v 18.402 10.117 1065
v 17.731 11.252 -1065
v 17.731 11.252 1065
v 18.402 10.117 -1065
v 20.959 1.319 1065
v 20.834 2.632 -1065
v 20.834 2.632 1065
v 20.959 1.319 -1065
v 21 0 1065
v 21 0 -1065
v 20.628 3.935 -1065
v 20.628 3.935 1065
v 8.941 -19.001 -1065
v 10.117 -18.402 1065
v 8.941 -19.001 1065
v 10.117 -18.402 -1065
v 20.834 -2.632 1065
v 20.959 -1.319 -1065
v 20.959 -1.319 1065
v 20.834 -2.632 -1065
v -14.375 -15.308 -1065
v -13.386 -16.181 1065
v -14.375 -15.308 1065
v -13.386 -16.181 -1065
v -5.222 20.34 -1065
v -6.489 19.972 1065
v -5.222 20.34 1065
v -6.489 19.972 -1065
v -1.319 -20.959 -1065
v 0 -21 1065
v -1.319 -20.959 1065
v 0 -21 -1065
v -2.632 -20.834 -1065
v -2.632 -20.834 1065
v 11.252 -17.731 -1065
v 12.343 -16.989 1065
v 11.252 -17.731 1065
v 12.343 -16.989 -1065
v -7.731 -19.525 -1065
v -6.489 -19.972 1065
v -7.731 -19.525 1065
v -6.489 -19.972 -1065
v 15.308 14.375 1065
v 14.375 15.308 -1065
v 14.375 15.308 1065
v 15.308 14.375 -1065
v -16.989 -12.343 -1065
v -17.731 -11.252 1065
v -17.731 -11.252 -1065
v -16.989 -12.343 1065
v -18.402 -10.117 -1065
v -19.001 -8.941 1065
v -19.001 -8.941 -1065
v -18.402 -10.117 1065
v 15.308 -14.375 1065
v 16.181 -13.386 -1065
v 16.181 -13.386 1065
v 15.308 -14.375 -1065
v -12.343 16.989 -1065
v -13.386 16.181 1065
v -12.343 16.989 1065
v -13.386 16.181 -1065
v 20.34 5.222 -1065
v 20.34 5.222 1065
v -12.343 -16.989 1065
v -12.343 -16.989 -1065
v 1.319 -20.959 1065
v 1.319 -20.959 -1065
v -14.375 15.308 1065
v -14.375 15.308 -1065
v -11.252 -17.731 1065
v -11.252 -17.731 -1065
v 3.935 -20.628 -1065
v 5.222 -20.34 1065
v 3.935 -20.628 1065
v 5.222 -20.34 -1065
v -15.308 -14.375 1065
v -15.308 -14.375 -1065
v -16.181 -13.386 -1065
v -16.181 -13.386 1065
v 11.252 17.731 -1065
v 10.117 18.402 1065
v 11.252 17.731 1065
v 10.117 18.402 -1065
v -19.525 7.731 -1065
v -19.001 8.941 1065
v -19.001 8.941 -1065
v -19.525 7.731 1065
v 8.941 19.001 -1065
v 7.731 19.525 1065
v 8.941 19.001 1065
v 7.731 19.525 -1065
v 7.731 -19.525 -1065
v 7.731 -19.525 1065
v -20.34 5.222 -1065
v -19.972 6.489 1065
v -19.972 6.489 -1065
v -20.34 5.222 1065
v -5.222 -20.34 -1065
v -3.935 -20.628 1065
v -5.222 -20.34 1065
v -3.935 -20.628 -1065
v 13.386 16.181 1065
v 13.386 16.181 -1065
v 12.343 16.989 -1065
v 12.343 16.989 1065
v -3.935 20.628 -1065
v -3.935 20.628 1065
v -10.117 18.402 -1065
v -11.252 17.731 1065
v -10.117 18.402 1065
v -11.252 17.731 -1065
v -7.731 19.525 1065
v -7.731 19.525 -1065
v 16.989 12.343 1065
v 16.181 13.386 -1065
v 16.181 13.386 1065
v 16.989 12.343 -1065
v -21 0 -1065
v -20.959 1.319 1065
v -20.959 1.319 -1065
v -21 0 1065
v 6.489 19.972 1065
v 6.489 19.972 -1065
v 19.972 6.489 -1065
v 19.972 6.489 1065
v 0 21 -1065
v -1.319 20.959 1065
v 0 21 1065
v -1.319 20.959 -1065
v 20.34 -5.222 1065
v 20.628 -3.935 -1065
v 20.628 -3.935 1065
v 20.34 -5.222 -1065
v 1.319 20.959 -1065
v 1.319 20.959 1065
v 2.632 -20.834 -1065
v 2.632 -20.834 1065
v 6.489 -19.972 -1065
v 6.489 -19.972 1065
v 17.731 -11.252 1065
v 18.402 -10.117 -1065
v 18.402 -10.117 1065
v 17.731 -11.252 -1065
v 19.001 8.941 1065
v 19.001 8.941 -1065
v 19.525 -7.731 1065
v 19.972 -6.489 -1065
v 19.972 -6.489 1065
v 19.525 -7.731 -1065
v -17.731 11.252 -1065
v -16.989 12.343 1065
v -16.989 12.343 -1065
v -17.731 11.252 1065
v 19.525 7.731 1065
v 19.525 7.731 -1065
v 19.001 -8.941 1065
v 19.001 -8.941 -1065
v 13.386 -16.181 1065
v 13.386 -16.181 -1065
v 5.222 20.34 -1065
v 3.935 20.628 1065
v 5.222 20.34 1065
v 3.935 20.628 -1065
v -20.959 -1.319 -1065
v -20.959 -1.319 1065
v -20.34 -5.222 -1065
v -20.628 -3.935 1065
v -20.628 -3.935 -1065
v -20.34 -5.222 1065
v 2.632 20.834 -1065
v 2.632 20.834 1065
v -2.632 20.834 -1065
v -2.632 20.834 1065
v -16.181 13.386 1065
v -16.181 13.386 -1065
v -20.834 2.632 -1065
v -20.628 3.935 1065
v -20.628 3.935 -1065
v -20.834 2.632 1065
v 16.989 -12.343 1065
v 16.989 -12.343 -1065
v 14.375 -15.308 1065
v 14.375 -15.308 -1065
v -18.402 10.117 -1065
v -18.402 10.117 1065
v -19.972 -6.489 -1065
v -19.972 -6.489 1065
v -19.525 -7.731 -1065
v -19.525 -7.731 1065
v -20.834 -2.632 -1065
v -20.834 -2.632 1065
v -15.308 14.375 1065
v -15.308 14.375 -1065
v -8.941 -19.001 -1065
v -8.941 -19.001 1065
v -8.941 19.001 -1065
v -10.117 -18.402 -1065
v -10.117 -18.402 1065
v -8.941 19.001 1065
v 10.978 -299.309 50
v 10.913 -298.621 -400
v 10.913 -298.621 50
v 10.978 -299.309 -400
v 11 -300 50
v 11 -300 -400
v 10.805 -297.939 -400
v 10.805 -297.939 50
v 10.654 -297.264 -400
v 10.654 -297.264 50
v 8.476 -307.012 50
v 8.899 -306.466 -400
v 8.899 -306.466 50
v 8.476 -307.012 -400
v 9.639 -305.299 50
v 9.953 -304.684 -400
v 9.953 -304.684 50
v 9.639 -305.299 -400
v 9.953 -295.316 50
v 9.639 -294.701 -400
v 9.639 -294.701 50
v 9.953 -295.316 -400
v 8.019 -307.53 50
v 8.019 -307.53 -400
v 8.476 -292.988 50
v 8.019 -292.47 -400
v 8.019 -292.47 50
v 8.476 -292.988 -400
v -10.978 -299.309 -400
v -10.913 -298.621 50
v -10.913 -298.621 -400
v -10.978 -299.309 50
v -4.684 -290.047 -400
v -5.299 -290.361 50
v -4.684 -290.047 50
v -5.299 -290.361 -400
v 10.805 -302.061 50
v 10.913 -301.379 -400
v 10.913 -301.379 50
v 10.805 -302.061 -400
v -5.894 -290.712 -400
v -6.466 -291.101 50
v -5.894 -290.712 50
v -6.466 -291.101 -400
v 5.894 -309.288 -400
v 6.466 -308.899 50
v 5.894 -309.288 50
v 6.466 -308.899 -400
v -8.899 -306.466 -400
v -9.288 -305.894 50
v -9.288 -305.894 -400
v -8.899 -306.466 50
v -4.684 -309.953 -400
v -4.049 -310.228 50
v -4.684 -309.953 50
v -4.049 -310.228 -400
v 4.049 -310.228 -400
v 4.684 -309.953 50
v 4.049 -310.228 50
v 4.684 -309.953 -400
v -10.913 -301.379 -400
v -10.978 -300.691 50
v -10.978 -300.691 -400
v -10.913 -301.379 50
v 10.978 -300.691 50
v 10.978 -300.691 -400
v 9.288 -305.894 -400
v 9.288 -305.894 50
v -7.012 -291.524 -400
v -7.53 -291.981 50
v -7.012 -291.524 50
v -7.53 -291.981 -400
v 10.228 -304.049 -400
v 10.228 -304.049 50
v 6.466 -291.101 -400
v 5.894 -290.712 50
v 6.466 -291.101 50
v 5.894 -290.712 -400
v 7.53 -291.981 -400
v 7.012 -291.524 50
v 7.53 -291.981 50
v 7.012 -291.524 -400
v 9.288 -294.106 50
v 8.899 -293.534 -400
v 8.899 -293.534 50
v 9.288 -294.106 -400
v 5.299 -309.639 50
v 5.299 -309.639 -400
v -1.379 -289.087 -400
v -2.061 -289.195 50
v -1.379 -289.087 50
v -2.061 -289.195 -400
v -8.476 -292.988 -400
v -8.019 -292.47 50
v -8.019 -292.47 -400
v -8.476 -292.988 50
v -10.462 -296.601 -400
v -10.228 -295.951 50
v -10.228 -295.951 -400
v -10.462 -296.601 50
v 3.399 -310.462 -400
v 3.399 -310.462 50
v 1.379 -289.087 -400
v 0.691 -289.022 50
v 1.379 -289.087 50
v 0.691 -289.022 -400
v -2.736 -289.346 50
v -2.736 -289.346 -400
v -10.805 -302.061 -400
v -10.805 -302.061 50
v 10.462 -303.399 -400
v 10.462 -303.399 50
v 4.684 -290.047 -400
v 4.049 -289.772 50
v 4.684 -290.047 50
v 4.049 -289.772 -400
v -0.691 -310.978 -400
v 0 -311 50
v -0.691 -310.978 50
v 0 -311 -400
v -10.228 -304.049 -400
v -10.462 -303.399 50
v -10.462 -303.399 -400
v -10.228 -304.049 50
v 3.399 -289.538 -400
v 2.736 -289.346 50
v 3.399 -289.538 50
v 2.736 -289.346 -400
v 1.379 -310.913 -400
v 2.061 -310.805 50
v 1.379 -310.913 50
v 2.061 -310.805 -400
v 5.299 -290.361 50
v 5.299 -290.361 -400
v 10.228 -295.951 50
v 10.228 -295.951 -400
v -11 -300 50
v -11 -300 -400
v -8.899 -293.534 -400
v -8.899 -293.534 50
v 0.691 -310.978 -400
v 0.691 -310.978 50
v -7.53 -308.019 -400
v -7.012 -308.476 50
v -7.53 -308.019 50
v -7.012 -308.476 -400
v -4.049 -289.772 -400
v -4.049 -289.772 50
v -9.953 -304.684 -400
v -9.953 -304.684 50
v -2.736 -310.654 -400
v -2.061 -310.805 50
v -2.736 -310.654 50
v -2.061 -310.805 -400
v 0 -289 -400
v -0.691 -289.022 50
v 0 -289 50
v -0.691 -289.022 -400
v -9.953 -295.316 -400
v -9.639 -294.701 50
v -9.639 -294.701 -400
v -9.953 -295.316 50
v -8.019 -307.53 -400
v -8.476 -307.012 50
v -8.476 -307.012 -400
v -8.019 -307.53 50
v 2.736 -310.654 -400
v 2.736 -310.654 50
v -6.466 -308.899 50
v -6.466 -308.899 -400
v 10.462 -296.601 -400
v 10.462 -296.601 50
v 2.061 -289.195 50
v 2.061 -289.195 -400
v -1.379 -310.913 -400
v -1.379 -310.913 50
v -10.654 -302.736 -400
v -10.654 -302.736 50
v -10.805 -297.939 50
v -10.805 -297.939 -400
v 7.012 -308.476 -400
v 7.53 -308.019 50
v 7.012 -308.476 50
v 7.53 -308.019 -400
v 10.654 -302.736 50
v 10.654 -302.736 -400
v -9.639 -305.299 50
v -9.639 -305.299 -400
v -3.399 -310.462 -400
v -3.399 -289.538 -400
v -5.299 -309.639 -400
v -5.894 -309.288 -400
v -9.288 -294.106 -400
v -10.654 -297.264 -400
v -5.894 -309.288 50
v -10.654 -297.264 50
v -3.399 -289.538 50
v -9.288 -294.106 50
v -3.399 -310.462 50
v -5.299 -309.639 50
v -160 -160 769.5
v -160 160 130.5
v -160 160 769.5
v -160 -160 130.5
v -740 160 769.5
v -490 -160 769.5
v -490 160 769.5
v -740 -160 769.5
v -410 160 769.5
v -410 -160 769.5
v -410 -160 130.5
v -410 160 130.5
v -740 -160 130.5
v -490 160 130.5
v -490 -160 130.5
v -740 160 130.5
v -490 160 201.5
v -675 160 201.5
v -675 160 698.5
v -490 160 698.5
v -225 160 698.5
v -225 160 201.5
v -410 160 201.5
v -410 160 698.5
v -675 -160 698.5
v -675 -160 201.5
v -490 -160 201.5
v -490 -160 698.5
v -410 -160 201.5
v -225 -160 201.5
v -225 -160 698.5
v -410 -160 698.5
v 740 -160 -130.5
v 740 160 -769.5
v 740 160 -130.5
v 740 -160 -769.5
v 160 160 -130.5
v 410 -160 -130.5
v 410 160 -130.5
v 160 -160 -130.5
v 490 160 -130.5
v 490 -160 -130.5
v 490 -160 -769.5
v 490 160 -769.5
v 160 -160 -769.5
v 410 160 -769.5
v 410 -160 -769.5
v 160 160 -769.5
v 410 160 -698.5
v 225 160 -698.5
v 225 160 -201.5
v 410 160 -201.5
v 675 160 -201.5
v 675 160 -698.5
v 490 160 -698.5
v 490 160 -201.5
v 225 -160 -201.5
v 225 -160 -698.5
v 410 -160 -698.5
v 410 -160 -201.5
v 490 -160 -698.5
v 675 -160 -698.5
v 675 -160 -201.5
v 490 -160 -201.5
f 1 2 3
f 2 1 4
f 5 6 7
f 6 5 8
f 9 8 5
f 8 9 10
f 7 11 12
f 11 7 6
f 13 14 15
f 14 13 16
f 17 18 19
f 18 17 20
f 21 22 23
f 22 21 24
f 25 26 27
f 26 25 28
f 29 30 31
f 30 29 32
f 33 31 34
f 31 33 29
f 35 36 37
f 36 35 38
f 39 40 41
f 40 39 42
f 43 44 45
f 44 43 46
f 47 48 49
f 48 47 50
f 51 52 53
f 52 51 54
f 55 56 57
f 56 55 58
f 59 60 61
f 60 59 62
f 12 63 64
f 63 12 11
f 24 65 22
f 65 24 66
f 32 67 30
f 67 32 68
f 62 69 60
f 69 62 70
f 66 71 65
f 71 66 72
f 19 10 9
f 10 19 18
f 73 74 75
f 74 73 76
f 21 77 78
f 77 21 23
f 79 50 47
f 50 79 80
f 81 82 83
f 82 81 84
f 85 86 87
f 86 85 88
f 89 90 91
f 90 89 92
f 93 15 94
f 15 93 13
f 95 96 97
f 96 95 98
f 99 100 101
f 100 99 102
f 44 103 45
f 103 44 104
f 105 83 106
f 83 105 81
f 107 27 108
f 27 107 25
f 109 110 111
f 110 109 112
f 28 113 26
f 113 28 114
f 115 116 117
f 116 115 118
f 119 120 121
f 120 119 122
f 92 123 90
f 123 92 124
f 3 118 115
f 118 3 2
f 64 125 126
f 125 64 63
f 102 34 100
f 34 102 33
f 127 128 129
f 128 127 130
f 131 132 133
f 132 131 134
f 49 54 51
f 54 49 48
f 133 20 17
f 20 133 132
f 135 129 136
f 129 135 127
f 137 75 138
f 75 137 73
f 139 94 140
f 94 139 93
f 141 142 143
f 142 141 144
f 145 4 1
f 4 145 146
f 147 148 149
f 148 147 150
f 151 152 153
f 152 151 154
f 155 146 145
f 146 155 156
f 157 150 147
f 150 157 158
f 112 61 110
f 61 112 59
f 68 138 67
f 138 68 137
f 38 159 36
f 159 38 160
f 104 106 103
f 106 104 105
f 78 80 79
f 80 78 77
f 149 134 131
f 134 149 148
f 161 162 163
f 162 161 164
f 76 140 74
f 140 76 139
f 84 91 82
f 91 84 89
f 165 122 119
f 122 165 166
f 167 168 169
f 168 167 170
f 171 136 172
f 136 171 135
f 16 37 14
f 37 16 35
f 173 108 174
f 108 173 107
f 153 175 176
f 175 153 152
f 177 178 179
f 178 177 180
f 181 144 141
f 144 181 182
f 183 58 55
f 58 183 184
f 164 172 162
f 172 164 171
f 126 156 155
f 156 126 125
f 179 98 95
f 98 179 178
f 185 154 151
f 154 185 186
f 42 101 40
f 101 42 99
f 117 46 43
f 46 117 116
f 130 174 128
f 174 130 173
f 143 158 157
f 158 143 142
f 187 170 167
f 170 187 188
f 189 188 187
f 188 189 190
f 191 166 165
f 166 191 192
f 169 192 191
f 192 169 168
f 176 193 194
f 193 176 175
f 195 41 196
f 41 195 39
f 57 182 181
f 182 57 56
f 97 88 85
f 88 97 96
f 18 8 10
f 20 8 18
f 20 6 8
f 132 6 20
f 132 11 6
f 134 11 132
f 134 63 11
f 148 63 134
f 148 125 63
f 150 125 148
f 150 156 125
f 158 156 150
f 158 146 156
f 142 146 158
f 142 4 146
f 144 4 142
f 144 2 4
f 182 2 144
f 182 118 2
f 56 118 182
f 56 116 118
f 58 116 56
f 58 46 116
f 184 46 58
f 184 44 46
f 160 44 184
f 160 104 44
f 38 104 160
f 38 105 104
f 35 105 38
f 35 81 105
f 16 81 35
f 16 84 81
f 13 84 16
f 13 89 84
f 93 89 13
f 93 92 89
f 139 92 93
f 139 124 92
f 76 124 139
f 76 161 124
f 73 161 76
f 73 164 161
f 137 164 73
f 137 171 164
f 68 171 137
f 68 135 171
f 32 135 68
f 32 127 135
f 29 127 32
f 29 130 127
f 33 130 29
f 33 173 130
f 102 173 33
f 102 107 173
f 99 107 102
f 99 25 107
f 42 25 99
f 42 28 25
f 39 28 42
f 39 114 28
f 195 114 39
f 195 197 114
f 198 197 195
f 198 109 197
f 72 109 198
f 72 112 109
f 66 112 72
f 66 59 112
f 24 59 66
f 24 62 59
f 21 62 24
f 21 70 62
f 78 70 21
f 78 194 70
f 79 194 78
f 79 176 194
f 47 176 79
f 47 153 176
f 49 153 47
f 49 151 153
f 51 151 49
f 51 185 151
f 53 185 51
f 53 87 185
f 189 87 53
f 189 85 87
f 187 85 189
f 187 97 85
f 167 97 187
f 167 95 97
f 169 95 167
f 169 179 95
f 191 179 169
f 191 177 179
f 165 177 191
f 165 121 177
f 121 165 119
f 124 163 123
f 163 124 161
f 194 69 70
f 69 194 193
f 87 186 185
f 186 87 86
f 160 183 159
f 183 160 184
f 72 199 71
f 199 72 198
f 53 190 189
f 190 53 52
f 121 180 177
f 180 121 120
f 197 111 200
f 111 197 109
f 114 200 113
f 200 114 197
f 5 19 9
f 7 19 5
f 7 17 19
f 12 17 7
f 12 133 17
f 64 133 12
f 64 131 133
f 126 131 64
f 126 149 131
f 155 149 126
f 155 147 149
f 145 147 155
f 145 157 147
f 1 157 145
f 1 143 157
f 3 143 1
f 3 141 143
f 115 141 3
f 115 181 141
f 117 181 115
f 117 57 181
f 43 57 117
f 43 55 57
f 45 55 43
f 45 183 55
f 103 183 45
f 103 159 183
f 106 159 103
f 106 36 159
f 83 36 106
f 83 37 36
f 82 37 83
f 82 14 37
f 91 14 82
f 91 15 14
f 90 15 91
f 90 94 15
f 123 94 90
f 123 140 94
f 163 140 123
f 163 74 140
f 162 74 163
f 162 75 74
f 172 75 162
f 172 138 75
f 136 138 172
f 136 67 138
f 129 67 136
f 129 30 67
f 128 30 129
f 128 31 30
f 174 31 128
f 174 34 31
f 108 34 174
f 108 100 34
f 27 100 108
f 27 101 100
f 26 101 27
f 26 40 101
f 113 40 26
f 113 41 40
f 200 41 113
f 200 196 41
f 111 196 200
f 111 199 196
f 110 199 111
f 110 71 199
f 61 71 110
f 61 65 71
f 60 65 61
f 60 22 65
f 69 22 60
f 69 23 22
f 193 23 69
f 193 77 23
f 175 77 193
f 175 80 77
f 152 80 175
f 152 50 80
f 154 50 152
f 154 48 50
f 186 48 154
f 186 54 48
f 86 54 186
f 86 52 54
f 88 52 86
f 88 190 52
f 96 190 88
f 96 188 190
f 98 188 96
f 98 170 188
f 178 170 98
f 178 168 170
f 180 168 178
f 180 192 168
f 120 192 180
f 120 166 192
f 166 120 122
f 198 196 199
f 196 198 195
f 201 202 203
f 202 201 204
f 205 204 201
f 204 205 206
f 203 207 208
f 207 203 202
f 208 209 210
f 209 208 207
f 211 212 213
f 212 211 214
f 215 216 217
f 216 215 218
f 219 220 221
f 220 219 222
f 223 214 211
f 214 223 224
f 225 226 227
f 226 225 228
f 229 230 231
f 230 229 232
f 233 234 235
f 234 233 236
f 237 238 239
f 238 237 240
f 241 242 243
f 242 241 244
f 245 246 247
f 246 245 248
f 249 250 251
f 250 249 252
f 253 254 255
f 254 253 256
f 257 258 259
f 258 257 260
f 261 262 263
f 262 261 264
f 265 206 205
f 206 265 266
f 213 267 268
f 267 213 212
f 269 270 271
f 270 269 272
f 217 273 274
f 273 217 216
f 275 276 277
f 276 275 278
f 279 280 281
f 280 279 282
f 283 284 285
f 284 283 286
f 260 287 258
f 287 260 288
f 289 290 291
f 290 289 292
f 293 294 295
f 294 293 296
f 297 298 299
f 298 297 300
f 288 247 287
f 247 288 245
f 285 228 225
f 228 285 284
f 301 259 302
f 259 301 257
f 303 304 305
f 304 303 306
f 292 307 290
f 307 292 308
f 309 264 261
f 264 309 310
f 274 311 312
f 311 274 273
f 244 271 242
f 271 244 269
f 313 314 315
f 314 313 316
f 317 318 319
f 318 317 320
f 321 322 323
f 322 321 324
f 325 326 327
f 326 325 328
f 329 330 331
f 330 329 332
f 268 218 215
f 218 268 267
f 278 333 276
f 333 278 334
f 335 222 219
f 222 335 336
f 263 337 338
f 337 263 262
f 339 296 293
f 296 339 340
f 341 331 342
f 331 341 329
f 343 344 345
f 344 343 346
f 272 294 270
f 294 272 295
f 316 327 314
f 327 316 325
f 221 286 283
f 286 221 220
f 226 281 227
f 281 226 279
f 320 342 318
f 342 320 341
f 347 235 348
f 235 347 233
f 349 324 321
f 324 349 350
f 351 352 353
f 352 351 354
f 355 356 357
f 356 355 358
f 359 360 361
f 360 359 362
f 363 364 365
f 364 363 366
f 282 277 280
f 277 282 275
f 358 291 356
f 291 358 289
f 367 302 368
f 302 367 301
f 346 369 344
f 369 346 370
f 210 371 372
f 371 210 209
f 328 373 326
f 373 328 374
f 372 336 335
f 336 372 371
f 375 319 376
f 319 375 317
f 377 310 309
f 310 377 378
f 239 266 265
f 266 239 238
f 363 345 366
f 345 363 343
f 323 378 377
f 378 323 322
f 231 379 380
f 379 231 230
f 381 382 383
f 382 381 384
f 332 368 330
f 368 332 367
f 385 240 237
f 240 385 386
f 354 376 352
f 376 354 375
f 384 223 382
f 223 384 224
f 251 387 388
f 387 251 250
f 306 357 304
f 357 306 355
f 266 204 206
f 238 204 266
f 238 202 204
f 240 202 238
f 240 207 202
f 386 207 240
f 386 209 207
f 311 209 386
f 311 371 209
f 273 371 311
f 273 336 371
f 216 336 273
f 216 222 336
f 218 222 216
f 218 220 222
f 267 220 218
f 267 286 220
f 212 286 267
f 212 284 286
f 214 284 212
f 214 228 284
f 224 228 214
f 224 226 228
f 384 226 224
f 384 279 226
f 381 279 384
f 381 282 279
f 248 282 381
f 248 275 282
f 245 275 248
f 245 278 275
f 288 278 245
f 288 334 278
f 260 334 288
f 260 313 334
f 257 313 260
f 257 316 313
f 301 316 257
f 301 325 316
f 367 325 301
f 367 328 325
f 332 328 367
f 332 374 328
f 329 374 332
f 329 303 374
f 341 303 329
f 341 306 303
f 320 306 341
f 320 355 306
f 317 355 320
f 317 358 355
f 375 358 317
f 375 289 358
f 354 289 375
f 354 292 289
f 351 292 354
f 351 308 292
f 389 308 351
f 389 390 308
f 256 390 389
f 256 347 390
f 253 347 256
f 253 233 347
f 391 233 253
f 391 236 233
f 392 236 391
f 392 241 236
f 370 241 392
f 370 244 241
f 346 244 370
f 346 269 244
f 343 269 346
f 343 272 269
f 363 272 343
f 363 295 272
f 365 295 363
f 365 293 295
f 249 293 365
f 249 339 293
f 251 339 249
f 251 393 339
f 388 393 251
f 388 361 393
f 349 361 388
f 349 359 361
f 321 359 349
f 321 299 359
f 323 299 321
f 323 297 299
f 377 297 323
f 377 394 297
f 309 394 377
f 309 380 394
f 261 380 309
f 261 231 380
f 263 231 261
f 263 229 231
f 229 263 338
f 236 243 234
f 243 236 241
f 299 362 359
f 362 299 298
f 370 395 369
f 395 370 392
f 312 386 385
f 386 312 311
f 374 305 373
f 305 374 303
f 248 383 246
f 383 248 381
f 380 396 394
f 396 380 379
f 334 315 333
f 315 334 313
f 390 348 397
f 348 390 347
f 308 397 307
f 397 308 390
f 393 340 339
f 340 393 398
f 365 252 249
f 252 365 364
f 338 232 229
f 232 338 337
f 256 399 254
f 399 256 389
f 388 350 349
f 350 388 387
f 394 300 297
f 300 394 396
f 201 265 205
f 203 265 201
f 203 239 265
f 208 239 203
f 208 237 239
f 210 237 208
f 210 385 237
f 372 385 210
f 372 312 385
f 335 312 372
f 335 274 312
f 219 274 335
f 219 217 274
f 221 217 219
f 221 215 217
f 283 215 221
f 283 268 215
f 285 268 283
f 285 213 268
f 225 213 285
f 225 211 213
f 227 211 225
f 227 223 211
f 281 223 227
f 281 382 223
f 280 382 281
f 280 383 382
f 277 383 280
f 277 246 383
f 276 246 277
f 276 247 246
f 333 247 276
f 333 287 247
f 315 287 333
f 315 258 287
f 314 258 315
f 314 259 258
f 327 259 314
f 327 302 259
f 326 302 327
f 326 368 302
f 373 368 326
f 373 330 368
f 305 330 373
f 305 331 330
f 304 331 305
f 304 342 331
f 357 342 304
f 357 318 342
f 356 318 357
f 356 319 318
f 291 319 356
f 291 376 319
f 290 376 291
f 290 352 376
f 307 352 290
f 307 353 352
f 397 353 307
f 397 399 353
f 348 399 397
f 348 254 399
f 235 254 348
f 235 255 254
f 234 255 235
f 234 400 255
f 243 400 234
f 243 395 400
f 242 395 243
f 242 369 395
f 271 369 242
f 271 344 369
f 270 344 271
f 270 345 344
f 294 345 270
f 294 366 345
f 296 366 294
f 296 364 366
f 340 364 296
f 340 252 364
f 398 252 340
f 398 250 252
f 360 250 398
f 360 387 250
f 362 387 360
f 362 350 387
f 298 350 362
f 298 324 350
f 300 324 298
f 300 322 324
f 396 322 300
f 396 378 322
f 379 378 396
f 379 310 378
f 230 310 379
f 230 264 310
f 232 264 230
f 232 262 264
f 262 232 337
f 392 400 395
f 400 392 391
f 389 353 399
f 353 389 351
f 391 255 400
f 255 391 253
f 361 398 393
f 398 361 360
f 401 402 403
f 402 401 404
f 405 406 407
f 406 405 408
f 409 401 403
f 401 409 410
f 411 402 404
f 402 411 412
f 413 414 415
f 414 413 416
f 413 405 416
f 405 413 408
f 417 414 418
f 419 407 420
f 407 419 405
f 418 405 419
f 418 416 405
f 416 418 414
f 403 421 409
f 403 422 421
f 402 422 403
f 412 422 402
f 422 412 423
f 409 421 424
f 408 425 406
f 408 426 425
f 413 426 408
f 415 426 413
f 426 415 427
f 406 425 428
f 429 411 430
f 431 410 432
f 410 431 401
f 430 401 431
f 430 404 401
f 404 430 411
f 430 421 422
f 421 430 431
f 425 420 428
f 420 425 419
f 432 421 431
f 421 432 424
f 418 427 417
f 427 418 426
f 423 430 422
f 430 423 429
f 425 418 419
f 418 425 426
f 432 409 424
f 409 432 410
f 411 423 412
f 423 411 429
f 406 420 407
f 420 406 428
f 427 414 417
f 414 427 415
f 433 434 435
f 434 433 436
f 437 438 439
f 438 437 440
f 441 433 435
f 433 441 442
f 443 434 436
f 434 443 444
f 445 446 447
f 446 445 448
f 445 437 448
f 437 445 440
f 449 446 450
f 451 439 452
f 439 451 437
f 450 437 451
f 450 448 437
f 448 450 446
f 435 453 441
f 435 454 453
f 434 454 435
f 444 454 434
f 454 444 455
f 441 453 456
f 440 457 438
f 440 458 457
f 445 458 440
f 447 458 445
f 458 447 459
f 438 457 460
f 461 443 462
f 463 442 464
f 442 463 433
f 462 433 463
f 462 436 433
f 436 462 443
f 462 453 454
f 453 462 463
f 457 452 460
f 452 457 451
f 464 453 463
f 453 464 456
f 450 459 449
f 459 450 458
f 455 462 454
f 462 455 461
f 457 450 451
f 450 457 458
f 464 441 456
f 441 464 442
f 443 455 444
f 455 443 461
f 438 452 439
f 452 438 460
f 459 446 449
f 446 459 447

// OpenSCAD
// ============================================================================
// PROJECT: XXXG-00W0 WING GUNDAM ZERO EW - GROUND INTERFACE INFRA
// COMPONENT VAULT: BANDAI CAST RUNNER A - STABILIZER FEET A5 & A6
// PACKAGING RE-ARCHITECTURE: SUB-ARMOR CAPACITOR RECESSED BANK INTEGRATION
// CONFIG METRIC: SCALED TITANIUM CASTS (1:1 ACTUAL METRIC UP-SCALE)
// ============================================================================

$fn = 100; // High-precision circular resolution segment count

// Structural Constants Scaled 1:1 for a 16.7-Meter Airframe Scale (mm)
foot_total_length = 1420;                // Total horizontal longitudinal sole length (mm)
foot_base_width = 580;                  // Maximum width of base frame anchor (mm)
armor_skin_thickness = 65;              // Solid TiAl protective plating wall (mm)
harness_conduit_width = 80;             // Cast-in 4oz copper logic trace track (mm)
capacitor_pocket_depth = 15;            // Sub-armor recessed housing pocket depth (mm)
capacitor_pocket_width = 140;           // Transverse MLCC array pocket width (mm)

module Runner_A_Foot_Stabilizer_Forge() {
    // Central Supply Injection Runner Axis (Molten Feed Line from Siphon Forge)
    color([0.22, 0.22, 0.25]) {
        cylinder(h = foot_total_length * 1.5, d = 42, center = true);
        // Direct injection gates tracking straight into the part mold cavities
        translate() rotate() cylinder(h = 450, d = 22);
        translate([0, -300, -400]) rotate() cylinder(h = 450, d = 22);
    }
    
    // Instantiate Scaled Skeutomorphic Part Molds Symmetrically (Left & Right)
    Cast_Internal_Stabilizer_Feet();
}

module Cast_Internal_Stabilizer_Feet() {
    // ---- PART A5: INTERNAL LEFT DYNAMIC AUTOMOTIVE BALANCE FOOT CORE ----
    translate([-450, 0, 450]) color([0.35, 0.35, 0.38]) { // Inner Frame Dark Spec
        difference() {
            // Main solid heavy-duty foot base structure block segment
            cube([foot_base_width, 320, foot_total_length * 0.45], center = true);
            
            // Core structural cutout for trailing recoil heel dampener alignment
            cube([foot_base_width - (armor_skin_thickness * 2), 340, foot_total_length * 0.35], center = true);
            
            // SUB-ARMOR RECESSED CAPACITOR POCKETS [Segmented rows cut inside the foot walls]
            for (z_offset = [-150, 0, 150]) {
                translate([(foot_base_width * 0.25 - armor_skin_thickness + capacitor_pocket_depth/2), 0, z_offset])
                    cube([capacitor_pocket_depth, capacitor_pocket_width, 100], center = true);
            }
            
            // Continuous cast-in routing track for the 4oz solid-state wiring rails
            cube([harness_conduit_width, 340, foot_total_length], center = true);
        }
    }
    
    // ---- PART A6: INTERNAL RIGHT DYNAMIC AUTOMOTIVE BALANCE FOOT CORE ----
    translate([450, 0, -450]) rotate() color([0.35, 0.35, 0.38]) {
        difference() {
            cube([foot_base_width, 320, foot_total_length * 0.45], center = true);
            cube([foot_base_width - (armor_skin_thickness * 2), 340, foot_total_length * 0.35], center = true);
            
            for (z_offset = [-150, 0, 150]) {
                translate([(foot_base_width * 0.25 - armor_skin_thickness + capacitor_pocket_depth/2), 0, z_offset])
                    cube([capacitor_pocket_width, capacitor_pocket_depth, 100], center = true);
            }
            
            cube([harness_conduit_width, 340, foot_total_length], center = true);
        }
    }
}

// Render Master Assembly to Parameter Workspace
Runner_A_Foot_Stabilizer_Forge();
